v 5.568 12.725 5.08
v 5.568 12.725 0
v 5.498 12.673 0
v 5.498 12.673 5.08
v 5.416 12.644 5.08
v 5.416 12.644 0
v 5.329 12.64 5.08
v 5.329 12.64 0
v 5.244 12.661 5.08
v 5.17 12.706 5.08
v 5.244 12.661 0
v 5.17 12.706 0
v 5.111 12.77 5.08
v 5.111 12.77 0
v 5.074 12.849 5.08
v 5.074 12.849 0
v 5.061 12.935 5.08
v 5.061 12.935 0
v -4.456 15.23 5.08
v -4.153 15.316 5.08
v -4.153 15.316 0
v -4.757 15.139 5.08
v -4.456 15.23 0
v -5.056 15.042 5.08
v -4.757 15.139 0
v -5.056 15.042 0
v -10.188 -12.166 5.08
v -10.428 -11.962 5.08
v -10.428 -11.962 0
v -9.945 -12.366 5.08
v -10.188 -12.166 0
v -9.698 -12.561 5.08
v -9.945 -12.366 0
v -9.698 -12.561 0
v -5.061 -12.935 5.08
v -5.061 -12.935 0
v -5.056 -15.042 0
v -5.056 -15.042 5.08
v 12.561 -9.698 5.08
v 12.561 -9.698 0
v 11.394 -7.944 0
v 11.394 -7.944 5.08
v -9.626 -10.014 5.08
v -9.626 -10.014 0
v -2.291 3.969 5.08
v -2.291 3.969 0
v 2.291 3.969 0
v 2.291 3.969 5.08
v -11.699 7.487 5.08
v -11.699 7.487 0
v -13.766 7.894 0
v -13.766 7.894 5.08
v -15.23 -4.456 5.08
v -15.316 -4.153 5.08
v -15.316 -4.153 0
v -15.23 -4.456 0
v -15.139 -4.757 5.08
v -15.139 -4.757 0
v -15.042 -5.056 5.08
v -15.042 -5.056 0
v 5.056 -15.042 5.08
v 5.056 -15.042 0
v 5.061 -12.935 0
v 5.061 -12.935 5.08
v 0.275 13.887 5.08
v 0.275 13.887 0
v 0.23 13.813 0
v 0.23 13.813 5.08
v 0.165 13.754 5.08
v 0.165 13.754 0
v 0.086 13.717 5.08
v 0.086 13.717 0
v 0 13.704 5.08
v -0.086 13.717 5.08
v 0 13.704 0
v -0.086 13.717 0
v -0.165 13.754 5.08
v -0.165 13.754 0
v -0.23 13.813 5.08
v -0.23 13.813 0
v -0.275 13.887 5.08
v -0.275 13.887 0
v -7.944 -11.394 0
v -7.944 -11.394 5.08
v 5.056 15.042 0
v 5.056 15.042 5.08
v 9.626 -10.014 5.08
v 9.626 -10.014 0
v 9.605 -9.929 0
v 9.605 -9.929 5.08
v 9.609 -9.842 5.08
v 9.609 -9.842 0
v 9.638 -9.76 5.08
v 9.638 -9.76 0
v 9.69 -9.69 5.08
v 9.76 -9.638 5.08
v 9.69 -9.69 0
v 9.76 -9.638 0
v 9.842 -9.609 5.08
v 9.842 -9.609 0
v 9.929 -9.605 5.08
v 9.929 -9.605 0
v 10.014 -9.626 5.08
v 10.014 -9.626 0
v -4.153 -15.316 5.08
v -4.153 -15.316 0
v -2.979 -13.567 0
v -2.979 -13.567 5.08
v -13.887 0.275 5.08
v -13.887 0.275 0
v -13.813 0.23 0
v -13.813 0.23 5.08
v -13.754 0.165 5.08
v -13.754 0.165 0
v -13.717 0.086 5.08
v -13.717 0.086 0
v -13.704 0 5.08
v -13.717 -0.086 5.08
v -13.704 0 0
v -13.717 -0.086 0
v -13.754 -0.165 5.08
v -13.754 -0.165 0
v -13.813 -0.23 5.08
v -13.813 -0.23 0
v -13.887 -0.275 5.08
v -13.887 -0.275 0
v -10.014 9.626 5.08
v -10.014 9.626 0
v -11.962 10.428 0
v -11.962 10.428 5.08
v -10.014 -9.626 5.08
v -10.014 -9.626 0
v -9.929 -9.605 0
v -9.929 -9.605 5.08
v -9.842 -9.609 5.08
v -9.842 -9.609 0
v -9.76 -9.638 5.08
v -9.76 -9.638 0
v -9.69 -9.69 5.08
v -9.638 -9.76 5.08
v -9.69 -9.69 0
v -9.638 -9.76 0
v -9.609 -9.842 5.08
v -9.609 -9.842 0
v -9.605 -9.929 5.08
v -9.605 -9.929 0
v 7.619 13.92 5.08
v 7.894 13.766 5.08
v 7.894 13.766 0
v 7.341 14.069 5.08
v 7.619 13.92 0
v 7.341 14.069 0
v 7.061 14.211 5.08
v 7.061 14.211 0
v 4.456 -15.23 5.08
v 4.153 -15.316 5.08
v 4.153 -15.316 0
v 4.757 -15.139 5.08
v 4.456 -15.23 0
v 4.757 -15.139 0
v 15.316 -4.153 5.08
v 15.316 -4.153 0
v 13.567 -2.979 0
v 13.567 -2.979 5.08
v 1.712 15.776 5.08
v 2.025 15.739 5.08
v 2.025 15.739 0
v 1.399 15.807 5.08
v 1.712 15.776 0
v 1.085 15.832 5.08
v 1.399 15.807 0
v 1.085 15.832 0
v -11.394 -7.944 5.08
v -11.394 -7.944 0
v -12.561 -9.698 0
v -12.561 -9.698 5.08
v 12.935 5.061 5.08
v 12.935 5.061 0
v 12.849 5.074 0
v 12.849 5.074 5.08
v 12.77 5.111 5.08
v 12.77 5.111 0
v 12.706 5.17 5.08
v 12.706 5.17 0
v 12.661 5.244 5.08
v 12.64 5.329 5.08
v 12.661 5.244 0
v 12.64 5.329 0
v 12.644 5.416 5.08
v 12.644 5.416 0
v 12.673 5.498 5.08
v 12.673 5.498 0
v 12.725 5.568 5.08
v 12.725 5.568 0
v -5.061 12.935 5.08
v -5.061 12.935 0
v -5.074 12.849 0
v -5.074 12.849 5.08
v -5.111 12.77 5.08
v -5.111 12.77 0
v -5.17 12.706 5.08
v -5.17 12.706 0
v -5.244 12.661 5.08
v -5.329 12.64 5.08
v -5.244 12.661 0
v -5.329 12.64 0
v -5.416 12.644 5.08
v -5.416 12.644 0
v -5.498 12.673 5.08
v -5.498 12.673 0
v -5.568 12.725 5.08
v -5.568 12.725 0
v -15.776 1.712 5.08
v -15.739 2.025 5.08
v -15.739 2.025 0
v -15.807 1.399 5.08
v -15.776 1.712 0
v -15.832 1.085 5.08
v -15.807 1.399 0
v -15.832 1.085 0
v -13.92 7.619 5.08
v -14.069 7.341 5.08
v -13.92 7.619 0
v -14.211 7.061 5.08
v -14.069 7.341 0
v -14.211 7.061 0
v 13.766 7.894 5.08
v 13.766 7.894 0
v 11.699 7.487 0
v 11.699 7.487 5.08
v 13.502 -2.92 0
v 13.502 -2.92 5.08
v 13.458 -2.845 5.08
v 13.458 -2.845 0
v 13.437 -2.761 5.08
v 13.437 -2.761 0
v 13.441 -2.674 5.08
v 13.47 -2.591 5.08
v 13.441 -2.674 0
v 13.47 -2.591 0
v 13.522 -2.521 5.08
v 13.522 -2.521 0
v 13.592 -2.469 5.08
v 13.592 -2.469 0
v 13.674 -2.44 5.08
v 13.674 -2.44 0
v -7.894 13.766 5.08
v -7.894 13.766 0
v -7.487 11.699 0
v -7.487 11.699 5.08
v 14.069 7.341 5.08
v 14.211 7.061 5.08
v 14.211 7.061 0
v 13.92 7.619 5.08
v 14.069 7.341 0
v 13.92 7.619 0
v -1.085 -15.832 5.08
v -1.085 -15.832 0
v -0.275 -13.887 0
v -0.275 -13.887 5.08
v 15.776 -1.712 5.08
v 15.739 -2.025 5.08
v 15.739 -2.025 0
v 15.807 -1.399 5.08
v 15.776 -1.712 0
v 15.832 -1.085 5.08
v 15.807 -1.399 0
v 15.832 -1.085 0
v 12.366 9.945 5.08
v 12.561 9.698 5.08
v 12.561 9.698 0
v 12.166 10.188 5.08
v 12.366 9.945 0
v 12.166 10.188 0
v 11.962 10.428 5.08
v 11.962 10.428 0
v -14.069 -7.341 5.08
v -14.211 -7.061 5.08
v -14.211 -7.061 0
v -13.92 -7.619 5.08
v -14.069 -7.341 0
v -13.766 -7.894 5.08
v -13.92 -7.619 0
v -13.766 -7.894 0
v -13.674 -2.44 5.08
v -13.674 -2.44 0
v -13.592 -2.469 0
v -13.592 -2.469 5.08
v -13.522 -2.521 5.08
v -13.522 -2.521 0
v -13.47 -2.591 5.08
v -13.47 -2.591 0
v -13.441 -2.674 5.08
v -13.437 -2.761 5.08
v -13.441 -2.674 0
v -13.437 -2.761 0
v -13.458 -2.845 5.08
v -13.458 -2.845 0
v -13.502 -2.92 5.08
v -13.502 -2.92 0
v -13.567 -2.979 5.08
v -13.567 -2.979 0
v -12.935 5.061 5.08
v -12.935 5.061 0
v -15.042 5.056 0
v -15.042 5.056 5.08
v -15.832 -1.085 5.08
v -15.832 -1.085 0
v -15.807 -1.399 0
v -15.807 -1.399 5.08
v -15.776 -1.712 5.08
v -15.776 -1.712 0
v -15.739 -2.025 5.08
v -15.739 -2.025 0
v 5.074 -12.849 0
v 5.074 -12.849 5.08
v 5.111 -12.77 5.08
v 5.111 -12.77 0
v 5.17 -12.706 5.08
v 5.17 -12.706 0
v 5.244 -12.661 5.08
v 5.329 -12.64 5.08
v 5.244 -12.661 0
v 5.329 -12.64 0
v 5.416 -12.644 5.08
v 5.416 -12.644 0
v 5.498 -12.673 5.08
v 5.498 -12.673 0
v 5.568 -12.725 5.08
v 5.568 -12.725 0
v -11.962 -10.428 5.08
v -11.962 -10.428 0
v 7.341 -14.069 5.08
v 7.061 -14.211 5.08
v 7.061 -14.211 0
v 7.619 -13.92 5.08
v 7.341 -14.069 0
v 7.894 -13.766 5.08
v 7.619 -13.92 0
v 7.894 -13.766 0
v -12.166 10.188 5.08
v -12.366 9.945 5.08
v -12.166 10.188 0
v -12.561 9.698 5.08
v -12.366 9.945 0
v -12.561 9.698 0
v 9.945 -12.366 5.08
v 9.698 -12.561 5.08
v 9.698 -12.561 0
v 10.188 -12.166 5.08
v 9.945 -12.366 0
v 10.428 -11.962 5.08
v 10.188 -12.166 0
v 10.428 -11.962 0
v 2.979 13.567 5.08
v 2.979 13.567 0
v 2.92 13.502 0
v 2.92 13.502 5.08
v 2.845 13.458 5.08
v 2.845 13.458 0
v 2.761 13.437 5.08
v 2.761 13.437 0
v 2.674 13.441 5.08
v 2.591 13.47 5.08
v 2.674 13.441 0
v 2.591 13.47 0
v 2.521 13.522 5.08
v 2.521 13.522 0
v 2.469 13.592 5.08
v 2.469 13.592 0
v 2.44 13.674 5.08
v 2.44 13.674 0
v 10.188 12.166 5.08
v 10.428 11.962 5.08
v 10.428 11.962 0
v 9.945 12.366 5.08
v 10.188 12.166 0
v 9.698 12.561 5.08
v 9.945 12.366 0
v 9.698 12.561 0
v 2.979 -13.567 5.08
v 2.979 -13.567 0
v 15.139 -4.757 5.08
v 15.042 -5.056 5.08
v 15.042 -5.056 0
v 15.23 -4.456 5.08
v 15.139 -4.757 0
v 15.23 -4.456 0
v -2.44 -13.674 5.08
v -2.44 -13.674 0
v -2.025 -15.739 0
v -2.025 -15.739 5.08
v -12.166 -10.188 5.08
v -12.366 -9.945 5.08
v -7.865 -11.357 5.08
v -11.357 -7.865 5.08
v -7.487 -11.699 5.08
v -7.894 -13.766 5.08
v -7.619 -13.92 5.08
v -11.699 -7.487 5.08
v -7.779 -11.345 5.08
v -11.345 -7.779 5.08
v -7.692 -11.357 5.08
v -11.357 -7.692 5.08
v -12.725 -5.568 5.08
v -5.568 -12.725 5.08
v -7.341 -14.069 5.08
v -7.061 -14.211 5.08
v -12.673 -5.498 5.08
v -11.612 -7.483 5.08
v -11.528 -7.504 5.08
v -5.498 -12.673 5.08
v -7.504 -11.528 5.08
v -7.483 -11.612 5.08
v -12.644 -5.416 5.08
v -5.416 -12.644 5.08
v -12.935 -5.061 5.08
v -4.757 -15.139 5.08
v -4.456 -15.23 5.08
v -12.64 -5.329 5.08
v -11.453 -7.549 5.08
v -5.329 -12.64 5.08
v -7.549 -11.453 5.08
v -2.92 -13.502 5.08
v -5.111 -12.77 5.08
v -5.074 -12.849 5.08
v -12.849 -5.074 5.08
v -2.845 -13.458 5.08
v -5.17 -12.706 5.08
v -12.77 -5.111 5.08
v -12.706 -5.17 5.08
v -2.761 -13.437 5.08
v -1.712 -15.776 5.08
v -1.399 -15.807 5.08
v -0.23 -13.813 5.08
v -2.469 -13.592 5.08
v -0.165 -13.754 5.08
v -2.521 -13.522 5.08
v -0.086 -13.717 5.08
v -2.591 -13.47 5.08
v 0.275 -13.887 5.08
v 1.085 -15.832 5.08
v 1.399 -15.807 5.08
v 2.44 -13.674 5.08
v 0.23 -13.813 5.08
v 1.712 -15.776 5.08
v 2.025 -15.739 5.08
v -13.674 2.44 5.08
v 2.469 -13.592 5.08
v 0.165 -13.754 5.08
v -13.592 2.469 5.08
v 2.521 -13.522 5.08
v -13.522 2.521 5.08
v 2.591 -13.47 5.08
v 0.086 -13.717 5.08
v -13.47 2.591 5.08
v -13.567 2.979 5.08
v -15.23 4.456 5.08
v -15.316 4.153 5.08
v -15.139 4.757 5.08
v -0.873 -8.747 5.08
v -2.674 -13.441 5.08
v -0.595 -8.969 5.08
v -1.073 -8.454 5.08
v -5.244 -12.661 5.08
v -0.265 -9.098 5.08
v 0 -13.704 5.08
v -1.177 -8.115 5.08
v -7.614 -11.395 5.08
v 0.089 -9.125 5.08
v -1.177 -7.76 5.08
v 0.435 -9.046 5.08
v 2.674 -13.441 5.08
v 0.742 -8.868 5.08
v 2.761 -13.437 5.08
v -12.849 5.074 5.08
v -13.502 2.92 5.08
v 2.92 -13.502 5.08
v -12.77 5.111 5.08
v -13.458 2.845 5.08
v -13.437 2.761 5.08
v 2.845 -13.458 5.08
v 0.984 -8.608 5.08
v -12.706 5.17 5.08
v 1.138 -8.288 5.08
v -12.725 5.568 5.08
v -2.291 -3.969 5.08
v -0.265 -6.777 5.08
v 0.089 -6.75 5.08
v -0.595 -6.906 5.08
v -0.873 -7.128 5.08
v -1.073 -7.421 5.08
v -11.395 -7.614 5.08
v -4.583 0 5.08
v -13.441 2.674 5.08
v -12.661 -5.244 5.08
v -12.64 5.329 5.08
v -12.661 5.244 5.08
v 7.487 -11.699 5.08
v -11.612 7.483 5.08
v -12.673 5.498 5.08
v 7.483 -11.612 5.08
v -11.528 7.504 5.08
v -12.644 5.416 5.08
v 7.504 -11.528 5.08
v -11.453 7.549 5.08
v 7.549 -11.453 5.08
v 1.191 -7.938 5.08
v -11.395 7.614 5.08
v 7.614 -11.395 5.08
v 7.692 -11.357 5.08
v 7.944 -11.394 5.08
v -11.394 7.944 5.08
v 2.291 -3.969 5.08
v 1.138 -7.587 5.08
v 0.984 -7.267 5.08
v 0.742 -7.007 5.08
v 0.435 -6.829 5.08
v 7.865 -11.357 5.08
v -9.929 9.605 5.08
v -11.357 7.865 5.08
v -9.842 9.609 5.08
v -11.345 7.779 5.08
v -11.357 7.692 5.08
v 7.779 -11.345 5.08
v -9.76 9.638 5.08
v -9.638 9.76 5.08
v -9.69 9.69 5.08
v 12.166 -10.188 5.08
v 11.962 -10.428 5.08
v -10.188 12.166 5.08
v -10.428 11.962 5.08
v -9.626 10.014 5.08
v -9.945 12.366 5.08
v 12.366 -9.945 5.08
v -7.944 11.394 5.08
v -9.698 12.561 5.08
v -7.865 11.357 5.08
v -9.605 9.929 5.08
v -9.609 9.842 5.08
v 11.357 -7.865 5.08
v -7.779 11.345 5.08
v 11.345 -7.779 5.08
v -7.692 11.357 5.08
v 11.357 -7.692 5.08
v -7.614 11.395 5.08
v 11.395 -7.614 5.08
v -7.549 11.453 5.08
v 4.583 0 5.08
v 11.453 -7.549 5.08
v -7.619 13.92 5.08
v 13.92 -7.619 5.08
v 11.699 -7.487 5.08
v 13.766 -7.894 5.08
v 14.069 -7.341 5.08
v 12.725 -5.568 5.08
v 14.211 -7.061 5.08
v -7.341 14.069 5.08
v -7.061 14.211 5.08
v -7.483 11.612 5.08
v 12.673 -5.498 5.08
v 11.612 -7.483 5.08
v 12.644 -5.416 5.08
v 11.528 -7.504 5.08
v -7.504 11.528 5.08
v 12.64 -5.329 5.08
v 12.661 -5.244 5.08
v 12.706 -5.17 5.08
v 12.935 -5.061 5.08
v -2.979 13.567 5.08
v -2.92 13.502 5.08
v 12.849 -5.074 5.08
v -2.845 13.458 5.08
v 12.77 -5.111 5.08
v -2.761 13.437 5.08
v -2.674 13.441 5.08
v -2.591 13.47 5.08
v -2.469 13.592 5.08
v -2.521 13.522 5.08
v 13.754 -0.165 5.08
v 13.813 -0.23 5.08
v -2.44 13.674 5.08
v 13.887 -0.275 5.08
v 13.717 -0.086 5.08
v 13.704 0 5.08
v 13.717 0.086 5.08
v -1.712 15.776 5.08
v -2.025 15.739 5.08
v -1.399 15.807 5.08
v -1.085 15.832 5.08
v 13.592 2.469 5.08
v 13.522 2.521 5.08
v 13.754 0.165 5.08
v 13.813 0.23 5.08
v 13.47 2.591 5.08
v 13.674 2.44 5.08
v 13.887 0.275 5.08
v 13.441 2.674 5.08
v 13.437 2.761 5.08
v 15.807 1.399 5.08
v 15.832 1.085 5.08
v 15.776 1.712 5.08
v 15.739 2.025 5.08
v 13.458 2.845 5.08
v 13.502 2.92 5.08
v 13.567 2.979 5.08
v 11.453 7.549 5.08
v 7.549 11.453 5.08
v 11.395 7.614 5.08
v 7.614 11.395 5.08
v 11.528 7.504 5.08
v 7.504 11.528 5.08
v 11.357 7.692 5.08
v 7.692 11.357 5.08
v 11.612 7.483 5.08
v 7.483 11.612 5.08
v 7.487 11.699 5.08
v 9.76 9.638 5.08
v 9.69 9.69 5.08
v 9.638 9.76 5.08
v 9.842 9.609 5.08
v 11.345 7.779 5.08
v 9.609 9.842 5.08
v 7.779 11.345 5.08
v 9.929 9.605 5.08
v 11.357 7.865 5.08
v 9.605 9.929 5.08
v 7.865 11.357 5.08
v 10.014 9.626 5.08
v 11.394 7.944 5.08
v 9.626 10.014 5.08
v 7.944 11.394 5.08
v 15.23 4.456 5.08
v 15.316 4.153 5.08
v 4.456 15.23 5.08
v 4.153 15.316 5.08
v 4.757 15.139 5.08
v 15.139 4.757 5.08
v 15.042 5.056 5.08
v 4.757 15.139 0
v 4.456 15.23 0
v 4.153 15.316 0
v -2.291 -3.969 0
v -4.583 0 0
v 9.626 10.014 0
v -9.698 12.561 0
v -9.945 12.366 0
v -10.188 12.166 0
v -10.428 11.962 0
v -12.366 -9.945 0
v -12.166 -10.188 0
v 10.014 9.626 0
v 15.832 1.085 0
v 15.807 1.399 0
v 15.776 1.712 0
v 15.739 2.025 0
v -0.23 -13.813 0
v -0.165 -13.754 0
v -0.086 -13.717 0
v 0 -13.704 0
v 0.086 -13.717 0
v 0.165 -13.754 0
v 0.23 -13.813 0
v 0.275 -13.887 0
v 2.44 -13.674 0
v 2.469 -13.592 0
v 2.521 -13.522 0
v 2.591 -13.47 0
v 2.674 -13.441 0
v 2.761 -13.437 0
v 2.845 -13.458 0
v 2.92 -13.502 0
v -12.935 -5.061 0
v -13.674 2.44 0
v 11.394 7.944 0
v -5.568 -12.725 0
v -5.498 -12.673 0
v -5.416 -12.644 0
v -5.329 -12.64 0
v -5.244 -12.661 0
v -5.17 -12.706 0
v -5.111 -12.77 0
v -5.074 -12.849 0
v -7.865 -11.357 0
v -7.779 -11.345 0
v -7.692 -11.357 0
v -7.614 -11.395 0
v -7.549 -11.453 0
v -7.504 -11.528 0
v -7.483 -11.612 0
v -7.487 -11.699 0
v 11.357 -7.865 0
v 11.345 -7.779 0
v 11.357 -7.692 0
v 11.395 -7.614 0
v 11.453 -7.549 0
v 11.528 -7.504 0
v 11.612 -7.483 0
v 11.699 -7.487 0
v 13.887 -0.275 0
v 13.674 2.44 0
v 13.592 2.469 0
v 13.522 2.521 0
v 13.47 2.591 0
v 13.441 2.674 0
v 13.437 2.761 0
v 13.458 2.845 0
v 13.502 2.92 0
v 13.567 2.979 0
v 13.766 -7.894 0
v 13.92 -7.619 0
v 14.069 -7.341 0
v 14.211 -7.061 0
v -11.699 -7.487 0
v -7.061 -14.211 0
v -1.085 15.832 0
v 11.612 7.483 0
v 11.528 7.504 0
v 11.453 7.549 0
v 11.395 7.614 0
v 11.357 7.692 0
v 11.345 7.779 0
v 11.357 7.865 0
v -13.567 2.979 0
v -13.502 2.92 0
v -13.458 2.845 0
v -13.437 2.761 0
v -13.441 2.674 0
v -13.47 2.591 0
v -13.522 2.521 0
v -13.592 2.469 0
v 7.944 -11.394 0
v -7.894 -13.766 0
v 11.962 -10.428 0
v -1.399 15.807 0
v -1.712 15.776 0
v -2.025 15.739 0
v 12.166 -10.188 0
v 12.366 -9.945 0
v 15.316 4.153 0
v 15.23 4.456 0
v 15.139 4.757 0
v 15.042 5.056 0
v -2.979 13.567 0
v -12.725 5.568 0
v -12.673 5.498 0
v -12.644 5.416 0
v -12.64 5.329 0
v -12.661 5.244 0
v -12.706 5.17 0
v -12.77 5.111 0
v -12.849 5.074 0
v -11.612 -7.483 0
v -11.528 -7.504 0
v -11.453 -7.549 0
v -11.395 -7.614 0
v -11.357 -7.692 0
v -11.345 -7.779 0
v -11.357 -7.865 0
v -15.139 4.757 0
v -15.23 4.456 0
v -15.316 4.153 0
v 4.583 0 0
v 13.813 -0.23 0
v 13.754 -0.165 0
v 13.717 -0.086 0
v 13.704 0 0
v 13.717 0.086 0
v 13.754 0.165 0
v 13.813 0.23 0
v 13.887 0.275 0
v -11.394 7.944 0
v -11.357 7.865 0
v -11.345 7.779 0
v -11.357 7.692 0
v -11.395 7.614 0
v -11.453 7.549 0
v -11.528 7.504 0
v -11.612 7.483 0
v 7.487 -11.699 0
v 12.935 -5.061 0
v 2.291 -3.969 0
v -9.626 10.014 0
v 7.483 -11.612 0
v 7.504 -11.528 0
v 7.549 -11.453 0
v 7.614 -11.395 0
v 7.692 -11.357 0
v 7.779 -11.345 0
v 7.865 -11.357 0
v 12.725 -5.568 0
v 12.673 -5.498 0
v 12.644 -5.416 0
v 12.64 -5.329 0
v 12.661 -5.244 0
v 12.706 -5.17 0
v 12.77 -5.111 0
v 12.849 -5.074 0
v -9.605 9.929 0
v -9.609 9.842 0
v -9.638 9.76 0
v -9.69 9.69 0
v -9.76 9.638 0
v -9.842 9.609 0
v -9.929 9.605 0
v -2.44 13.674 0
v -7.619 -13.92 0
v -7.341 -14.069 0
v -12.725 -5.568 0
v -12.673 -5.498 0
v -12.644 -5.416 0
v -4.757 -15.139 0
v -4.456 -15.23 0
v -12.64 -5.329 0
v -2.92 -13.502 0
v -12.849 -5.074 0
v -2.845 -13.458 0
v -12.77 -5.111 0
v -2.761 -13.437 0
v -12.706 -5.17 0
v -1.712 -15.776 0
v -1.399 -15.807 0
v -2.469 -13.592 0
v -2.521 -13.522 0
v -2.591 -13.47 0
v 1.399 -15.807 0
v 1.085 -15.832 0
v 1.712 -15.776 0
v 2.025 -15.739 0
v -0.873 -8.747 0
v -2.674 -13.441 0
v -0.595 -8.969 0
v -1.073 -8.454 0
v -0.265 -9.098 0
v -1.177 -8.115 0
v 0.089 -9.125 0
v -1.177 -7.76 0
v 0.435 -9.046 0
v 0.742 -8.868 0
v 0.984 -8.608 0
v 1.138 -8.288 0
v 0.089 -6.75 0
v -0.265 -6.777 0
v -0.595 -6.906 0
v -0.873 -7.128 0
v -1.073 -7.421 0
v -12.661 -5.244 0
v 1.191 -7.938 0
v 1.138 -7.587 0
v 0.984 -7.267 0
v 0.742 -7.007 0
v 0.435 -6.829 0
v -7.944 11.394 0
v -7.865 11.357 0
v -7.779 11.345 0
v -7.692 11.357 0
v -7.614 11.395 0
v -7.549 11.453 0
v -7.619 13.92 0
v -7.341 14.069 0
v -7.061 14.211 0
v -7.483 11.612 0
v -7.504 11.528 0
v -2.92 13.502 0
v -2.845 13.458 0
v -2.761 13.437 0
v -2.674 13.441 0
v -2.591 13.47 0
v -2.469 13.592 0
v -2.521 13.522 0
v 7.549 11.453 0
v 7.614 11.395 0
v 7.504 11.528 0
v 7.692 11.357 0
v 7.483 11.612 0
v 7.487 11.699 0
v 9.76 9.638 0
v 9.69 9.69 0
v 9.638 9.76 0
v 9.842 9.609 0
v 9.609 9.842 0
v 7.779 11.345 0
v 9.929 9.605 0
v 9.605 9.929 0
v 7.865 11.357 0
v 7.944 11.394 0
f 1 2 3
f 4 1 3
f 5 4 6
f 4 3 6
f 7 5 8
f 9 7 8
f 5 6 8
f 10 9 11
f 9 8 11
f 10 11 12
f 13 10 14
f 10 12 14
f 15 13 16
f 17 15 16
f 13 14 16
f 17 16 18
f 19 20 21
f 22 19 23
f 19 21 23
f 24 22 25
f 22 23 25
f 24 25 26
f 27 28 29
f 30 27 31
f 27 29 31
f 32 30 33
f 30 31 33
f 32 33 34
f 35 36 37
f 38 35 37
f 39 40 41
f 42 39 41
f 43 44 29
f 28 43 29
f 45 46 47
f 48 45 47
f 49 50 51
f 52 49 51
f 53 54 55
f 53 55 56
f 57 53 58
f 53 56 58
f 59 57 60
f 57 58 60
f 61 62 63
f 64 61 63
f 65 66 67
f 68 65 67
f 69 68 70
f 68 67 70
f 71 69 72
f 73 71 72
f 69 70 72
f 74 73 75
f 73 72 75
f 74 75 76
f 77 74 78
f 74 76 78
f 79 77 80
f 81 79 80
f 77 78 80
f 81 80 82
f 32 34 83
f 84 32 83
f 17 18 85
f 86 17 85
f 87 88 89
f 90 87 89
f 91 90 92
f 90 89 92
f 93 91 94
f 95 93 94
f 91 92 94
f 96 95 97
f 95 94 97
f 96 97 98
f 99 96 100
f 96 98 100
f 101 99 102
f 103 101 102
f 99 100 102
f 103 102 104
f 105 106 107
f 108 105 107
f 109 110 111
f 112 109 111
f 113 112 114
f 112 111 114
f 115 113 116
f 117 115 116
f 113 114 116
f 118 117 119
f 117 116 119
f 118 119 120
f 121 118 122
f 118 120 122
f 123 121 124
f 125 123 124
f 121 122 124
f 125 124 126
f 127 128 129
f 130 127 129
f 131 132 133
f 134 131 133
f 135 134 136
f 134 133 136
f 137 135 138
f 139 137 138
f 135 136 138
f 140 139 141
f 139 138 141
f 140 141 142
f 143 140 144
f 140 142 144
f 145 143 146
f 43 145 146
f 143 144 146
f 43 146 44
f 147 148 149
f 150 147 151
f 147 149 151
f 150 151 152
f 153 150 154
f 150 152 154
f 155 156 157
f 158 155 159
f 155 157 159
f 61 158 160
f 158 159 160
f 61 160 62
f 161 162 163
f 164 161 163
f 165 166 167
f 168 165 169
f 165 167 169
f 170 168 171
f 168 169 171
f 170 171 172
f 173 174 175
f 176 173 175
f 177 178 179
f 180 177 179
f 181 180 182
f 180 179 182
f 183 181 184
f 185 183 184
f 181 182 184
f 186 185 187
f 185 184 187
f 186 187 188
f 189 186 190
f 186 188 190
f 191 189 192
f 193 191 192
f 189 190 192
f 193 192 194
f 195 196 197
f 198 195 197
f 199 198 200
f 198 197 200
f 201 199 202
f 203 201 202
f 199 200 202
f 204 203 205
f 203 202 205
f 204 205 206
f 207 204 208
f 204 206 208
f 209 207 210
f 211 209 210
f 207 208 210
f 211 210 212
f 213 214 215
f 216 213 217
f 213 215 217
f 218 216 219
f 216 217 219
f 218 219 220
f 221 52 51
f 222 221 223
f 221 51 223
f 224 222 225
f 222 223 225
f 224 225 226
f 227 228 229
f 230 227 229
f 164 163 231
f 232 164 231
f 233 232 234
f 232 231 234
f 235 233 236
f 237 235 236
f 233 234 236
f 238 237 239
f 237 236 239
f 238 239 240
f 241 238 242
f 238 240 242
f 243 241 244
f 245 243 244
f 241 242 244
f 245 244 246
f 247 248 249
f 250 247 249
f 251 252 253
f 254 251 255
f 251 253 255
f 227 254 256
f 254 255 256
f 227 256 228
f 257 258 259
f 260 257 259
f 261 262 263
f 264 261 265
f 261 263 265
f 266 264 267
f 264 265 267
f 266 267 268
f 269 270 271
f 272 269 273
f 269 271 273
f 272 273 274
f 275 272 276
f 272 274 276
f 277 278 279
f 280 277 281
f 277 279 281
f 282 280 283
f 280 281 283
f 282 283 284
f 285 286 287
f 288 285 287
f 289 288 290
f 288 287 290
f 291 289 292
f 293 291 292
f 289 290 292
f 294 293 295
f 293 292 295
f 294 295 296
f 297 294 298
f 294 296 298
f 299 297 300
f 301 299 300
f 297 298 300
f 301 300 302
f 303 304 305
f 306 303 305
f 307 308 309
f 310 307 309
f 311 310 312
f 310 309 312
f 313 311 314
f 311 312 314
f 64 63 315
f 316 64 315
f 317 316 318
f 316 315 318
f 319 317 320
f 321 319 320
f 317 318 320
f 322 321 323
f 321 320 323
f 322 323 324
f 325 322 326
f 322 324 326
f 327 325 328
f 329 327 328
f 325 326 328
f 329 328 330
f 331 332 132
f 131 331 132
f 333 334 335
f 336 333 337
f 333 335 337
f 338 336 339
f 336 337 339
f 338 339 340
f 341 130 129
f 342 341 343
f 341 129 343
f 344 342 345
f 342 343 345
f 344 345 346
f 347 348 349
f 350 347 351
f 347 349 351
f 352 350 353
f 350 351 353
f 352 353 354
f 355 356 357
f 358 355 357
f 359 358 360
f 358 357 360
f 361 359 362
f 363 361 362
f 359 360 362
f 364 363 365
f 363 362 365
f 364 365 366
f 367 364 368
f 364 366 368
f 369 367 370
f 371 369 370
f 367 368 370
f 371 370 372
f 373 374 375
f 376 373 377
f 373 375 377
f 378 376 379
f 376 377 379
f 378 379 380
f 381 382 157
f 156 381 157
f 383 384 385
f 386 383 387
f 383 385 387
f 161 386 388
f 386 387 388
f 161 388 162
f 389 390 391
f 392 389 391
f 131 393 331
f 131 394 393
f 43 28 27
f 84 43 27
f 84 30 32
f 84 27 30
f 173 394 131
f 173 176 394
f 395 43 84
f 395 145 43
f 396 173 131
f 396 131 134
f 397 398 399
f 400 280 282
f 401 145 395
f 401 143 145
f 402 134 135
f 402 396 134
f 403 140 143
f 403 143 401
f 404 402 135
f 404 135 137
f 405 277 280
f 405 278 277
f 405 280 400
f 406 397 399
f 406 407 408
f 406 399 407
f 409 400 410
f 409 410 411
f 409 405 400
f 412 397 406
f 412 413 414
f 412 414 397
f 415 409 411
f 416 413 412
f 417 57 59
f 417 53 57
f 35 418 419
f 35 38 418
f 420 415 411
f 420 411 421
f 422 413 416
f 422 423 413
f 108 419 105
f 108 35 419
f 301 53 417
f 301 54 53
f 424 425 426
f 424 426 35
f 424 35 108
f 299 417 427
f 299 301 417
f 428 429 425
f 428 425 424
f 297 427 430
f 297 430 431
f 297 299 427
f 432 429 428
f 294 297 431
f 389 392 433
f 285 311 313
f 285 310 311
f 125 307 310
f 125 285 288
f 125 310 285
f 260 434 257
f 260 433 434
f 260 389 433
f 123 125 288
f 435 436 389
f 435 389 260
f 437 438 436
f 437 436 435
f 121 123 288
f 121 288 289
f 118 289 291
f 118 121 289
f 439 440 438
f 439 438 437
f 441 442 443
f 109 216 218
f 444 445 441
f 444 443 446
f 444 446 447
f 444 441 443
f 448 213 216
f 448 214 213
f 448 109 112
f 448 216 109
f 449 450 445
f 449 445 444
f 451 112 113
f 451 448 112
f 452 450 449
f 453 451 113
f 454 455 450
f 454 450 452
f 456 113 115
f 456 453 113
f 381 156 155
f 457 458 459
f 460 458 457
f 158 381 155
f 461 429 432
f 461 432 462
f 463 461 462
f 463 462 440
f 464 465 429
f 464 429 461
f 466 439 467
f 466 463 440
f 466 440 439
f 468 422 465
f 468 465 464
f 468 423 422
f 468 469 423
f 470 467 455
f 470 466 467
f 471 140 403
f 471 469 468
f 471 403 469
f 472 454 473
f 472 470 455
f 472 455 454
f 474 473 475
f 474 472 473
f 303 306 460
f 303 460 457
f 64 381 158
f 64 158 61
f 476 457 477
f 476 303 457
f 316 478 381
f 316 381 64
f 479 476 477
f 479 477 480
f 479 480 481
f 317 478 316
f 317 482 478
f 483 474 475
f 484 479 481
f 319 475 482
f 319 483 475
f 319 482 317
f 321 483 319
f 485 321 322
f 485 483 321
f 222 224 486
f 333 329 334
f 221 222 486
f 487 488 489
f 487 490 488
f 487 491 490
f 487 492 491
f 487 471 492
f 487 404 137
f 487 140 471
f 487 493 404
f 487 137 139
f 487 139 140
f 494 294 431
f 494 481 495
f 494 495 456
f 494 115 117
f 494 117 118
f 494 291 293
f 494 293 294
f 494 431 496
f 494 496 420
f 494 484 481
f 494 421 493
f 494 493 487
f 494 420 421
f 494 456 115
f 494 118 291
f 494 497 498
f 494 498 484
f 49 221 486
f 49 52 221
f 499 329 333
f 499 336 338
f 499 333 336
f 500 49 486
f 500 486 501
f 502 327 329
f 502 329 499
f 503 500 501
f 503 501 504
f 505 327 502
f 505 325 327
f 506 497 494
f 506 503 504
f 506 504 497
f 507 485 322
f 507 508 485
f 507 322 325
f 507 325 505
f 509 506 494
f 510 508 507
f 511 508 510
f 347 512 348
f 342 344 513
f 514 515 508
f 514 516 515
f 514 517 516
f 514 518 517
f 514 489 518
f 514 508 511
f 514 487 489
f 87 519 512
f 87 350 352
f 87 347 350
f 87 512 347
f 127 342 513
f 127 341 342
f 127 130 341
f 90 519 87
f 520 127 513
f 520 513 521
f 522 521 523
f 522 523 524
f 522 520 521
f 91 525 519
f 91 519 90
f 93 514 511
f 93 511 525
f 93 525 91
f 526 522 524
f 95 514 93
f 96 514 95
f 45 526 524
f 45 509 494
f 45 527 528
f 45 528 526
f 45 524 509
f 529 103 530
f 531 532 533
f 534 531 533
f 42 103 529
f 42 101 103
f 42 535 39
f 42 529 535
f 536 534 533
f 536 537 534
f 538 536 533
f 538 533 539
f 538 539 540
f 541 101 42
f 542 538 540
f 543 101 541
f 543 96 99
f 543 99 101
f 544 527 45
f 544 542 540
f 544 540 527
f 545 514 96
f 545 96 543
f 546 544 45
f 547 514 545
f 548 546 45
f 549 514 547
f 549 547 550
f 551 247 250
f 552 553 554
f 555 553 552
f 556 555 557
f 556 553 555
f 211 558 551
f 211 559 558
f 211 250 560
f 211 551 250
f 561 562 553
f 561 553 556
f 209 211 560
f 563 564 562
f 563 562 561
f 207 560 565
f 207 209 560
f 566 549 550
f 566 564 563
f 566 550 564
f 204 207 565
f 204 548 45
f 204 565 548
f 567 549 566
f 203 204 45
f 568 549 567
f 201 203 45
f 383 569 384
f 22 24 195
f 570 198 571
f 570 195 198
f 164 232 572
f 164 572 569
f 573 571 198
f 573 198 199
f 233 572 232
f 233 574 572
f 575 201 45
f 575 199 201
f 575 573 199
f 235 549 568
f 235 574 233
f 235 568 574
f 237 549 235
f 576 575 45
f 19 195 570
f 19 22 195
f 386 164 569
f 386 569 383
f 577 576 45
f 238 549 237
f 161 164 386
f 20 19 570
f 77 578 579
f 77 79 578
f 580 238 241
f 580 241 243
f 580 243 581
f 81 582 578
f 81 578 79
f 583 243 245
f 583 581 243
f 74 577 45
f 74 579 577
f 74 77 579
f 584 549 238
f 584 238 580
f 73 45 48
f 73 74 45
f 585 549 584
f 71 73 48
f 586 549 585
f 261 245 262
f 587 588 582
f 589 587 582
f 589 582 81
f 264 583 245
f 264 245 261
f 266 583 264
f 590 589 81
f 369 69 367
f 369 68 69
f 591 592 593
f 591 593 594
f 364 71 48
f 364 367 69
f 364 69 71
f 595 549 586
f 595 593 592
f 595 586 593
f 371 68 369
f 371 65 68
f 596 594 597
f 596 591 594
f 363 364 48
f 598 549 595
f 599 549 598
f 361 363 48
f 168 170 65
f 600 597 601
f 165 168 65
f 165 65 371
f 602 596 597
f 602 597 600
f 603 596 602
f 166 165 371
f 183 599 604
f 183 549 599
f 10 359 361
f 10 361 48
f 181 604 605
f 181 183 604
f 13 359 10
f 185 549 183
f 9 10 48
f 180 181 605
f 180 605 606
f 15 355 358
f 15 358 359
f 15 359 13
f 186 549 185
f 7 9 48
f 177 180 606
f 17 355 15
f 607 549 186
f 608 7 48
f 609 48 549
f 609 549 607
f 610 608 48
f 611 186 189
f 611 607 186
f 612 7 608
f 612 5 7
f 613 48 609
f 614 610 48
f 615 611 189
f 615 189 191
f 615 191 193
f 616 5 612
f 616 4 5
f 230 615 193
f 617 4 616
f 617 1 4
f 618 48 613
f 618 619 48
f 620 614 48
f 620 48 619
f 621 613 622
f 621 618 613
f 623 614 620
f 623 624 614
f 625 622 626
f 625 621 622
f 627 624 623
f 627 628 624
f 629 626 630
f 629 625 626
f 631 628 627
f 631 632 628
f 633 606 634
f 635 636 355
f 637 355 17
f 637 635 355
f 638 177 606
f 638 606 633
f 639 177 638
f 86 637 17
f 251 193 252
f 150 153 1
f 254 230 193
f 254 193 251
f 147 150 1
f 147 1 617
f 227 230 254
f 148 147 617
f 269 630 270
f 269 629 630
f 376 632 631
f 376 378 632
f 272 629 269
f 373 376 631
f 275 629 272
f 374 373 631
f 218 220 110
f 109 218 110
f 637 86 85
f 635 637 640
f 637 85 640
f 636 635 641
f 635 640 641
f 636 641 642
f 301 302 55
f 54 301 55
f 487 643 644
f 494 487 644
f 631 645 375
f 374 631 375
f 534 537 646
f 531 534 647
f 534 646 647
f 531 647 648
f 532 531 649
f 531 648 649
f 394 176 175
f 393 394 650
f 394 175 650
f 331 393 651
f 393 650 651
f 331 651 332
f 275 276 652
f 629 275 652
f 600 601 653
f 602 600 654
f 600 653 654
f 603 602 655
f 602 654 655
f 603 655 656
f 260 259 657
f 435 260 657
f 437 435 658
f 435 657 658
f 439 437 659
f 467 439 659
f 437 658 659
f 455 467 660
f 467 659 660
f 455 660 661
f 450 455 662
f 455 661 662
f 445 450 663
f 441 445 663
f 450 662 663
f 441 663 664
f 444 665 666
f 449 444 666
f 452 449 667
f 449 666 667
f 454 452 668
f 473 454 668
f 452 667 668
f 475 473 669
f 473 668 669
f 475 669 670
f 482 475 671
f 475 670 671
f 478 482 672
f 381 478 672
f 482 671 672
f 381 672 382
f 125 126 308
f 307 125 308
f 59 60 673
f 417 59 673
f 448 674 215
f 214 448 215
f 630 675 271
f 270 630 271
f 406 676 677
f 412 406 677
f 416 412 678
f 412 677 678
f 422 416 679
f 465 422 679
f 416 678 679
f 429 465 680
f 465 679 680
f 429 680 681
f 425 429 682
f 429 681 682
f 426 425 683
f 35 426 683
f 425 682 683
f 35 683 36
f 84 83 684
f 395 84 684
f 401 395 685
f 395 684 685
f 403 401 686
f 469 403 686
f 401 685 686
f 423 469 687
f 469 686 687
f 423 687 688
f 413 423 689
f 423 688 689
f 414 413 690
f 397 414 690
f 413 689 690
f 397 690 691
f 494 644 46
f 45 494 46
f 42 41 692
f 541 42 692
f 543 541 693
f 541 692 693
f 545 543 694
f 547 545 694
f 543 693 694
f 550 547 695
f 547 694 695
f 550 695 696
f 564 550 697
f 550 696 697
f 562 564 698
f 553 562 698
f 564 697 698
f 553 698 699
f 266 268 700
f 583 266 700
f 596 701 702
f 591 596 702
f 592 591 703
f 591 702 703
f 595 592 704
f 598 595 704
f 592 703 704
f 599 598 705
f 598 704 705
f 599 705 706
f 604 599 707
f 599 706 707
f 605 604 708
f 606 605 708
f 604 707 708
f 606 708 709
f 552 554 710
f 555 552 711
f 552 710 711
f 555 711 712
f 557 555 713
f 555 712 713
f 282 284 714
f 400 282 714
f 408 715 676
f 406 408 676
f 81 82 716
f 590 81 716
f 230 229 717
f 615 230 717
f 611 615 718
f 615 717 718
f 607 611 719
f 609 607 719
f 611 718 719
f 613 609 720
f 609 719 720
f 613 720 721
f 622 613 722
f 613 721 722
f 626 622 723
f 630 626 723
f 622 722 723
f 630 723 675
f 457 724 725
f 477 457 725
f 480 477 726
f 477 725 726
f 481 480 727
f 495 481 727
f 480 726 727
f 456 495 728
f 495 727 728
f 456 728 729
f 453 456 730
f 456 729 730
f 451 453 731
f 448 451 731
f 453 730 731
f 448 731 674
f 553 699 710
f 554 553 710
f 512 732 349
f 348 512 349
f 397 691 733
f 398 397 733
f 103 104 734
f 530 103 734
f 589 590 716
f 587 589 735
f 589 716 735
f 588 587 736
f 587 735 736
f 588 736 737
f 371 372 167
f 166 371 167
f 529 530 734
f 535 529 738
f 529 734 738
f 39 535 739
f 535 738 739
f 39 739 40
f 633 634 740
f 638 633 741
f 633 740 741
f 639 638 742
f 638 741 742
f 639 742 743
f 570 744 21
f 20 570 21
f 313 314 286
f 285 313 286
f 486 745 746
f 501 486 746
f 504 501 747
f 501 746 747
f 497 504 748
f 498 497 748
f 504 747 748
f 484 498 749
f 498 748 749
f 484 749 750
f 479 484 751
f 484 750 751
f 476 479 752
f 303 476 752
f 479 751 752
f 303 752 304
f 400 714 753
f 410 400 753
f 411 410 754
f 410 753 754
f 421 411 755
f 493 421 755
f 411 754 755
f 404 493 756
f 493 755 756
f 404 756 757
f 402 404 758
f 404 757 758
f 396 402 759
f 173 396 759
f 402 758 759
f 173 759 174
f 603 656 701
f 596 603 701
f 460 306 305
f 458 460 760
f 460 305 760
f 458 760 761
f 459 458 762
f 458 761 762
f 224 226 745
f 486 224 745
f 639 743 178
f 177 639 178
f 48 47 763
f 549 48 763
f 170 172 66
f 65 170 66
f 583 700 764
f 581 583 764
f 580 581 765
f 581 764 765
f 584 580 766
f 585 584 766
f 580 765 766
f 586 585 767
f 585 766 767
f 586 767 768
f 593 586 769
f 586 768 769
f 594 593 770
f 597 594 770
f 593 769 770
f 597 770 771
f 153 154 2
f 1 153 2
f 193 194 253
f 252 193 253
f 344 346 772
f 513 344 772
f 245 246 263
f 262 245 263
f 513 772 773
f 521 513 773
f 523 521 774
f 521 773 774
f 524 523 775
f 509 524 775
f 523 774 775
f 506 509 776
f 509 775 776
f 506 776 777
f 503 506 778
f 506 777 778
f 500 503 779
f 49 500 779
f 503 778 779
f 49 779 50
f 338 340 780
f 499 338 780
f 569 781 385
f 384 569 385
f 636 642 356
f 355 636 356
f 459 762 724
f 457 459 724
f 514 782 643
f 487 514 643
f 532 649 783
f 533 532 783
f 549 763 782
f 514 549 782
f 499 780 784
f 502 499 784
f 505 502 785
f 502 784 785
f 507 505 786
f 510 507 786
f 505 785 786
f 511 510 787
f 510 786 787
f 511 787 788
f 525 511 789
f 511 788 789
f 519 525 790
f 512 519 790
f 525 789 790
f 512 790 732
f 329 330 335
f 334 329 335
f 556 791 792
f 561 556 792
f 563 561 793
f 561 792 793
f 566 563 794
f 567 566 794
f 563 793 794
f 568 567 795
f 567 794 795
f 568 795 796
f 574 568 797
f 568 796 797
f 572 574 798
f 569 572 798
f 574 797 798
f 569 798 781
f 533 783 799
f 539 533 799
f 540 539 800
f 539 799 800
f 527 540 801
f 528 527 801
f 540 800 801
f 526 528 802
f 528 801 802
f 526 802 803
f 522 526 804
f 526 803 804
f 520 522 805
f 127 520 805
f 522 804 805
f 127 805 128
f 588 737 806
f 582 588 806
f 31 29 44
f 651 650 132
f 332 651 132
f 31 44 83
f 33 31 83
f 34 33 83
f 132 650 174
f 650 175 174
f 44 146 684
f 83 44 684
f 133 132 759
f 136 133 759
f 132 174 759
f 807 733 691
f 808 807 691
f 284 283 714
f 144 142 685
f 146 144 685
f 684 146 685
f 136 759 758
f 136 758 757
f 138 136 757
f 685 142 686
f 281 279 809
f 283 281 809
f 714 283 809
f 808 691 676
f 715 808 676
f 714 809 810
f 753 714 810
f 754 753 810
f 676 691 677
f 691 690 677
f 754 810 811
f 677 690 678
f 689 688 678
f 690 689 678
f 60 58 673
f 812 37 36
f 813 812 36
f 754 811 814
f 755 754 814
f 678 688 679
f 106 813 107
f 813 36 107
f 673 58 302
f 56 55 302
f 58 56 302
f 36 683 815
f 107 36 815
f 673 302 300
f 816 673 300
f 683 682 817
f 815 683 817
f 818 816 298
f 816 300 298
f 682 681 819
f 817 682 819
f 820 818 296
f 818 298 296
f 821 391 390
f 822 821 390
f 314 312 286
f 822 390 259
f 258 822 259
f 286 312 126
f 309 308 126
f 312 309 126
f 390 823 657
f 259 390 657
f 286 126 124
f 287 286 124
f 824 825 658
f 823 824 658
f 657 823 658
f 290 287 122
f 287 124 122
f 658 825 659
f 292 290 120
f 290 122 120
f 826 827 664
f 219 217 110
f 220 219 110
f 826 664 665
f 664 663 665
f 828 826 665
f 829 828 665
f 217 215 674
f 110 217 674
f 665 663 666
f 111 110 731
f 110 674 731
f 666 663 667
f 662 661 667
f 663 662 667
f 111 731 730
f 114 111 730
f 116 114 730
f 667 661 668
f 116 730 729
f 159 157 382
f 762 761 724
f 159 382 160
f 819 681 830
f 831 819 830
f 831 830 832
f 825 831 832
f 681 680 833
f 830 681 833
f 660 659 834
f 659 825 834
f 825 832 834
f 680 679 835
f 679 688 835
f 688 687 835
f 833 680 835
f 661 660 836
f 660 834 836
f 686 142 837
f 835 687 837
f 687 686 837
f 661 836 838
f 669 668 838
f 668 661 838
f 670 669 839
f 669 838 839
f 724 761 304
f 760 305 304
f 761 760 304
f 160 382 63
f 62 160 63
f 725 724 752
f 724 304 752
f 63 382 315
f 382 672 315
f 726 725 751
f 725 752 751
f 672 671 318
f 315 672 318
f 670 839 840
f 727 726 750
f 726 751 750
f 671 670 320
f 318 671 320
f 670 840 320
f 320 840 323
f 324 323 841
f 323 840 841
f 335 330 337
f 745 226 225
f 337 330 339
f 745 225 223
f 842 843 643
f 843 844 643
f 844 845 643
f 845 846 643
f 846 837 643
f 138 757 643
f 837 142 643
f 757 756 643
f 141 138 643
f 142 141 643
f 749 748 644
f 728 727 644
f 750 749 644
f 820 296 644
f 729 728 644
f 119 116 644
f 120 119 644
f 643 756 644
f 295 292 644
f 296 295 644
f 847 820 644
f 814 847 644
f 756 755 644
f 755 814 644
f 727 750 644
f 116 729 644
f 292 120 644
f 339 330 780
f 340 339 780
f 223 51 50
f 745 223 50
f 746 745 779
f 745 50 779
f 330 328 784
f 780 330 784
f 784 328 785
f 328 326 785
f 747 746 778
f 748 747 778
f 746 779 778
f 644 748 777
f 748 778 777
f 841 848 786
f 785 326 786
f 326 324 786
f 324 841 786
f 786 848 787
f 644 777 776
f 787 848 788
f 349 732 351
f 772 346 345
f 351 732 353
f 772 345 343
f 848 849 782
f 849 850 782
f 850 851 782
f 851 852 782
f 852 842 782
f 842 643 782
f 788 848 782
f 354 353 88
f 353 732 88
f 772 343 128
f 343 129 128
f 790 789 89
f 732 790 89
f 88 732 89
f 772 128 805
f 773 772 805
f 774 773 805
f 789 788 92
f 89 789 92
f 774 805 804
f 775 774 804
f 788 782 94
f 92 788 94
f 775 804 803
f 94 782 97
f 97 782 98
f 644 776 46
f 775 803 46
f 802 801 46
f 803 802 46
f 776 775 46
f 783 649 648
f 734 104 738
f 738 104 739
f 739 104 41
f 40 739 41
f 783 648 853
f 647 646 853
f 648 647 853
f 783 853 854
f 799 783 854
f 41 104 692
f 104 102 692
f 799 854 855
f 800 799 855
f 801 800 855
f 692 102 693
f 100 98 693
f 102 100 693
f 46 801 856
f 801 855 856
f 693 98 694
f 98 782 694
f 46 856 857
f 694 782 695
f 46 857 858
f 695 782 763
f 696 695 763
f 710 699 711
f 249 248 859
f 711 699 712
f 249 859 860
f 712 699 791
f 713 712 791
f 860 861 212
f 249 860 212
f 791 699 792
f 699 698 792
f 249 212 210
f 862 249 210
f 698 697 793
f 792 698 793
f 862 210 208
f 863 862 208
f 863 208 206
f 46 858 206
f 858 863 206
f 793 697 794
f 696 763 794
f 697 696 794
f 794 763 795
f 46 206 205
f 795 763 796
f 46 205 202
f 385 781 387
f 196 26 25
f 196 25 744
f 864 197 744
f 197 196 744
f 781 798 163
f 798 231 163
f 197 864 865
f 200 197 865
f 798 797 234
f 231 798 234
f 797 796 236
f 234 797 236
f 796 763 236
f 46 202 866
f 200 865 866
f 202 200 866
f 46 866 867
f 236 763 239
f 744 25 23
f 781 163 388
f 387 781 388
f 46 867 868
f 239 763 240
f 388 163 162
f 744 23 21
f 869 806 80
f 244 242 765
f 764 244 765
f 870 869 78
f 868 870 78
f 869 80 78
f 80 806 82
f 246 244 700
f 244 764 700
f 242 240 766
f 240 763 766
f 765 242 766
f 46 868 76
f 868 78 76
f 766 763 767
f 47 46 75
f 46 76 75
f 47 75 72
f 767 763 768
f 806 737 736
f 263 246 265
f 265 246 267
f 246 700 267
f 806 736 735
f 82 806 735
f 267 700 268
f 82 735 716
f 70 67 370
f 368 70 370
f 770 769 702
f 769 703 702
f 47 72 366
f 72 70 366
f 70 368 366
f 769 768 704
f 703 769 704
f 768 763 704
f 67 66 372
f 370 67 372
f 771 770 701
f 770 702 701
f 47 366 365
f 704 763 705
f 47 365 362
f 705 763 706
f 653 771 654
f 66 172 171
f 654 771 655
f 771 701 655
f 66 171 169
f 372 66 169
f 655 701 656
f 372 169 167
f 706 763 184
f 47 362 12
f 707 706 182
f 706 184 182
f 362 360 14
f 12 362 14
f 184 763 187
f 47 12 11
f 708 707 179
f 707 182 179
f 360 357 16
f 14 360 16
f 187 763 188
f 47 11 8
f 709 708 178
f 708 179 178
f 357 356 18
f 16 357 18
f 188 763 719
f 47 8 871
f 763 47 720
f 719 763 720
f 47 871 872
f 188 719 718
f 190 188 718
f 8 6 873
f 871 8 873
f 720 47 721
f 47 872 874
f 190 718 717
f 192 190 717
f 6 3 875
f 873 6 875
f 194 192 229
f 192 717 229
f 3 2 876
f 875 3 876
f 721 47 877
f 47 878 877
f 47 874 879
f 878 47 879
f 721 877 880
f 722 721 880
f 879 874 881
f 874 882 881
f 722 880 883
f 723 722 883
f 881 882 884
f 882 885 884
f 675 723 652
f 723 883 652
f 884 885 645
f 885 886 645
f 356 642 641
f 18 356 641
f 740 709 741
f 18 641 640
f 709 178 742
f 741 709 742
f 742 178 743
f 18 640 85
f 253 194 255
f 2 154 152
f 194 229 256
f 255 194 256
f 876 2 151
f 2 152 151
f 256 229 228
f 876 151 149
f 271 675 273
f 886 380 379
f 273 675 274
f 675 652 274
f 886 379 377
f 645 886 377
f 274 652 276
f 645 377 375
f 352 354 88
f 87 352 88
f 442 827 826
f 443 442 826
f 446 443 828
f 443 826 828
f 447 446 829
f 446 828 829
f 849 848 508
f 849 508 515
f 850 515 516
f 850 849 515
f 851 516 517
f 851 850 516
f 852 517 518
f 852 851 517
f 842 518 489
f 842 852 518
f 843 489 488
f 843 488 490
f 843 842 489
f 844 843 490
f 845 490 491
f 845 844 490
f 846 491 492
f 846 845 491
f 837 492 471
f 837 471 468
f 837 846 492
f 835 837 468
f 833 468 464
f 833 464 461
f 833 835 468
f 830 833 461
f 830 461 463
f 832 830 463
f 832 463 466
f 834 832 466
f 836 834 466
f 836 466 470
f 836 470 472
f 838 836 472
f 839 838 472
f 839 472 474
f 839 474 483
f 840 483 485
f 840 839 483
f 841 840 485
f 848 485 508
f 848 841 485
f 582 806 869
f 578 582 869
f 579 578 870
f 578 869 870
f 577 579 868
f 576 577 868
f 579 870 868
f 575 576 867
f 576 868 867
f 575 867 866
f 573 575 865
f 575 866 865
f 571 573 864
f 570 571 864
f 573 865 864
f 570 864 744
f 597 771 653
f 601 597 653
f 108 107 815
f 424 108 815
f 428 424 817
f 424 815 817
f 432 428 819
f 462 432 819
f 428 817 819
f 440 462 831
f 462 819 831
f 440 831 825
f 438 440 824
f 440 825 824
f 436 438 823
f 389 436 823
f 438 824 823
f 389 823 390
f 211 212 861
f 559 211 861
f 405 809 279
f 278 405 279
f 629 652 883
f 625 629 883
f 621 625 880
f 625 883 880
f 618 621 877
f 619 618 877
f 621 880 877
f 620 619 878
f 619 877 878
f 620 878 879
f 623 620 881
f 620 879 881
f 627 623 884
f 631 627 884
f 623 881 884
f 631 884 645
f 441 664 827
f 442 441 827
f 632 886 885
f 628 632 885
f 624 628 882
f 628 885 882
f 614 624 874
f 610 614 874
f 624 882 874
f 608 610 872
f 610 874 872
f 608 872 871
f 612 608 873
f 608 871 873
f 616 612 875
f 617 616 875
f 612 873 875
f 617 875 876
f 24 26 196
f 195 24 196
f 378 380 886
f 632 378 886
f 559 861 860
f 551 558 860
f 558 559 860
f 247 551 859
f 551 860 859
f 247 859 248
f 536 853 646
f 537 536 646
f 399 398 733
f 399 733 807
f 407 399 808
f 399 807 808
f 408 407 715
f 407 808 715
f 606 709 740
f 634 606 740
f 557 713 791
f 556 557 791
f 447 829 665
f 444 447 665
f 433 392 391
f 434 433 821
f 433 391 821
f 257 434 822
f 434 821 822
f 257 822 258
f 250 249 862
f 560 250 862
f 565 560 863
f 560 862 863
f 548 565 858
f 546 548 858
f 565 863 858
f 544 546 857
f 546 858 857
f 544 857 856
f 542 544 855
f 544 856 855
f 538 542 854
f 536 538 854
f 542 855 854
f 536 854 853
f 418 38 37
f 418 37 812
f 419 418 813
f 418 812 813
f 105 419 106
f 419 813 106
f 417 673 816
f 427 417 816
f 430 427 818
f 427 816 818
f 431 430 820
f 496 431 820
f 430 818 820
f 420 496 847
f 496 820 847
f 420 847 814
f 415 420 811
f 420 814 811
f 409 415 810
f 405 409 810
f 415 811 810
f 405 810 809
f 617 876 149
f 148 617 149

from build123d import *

# Parameters (mm, degrees)
F0_R            = 15.8688012495
F0_R_2          = 1.190625
F1_DEPTH        = 5.08
F3_DEPTH        = 5.08
F3_COPIES_COUNT = 32


# Not quite as in the source:
# - a pattern or mirror of a feature is missing from the dataset's text; its kind, count and spacing are read off the source's solid


with BuildPart() as f1:
    # F0 (on Top) → F1 (new body)
    with BuildSketch(Plane.XY):
        Circle(F0_R)
        with Locations((0, -7.9375)):
            Circle(F0_R_2, mode=Mode.SUBTRACT)
        Polygon((-4.5827177617, 0), (-2.2913588808, 3.96875), (2.2913588808, 3.96875), (4.5827177617, 0), (2.2913588808, -3.96875), (-2.2913588808, -3.96875), align=None, mode=Mode.SUBTRACT)
    extrude(amount=F1_DEPTH)

    # F2 (on face) → F3 (cut, through all)
    with BuildSketch(Plane(origin=(0, 0, 0), x_dir=(1, 0, 0), z_dir=(0, 0, -1))):
        with BuildLine():
            Line((0.2746540111, 13.8873319852), (1.0847660613, 15.8316813917))
            ThreePointArc((1.0847660613, 15.8316813917), (0, 15.8688012495), (-1.0847660613, 15.8316813917))
            Line((-1.0847660613, 15.8316813917), (-0.2746540111, 13.8873319852))
            ThreePointArc((-0.2746540111, 13.8873319852), (0, 13.7042263959), (0.2746540111, 13.8873319852))
        make_face()
    f3 = extrude(amount=-F3_DEPTH, mode=Mode.SUBTRACT)

    # F3_copies: F3 ×32 about axis
    f3_copies_axis = Axis((0, 0, 0), (0, 0, 1))
    for i in range(1, F3_COPIES_COUNT):
        add(f3.rotate(f3_copies_axis, i * 360 / F3_COPIES_COUNT), mode=Mode.SUBTRACT)


solid = f1.part
